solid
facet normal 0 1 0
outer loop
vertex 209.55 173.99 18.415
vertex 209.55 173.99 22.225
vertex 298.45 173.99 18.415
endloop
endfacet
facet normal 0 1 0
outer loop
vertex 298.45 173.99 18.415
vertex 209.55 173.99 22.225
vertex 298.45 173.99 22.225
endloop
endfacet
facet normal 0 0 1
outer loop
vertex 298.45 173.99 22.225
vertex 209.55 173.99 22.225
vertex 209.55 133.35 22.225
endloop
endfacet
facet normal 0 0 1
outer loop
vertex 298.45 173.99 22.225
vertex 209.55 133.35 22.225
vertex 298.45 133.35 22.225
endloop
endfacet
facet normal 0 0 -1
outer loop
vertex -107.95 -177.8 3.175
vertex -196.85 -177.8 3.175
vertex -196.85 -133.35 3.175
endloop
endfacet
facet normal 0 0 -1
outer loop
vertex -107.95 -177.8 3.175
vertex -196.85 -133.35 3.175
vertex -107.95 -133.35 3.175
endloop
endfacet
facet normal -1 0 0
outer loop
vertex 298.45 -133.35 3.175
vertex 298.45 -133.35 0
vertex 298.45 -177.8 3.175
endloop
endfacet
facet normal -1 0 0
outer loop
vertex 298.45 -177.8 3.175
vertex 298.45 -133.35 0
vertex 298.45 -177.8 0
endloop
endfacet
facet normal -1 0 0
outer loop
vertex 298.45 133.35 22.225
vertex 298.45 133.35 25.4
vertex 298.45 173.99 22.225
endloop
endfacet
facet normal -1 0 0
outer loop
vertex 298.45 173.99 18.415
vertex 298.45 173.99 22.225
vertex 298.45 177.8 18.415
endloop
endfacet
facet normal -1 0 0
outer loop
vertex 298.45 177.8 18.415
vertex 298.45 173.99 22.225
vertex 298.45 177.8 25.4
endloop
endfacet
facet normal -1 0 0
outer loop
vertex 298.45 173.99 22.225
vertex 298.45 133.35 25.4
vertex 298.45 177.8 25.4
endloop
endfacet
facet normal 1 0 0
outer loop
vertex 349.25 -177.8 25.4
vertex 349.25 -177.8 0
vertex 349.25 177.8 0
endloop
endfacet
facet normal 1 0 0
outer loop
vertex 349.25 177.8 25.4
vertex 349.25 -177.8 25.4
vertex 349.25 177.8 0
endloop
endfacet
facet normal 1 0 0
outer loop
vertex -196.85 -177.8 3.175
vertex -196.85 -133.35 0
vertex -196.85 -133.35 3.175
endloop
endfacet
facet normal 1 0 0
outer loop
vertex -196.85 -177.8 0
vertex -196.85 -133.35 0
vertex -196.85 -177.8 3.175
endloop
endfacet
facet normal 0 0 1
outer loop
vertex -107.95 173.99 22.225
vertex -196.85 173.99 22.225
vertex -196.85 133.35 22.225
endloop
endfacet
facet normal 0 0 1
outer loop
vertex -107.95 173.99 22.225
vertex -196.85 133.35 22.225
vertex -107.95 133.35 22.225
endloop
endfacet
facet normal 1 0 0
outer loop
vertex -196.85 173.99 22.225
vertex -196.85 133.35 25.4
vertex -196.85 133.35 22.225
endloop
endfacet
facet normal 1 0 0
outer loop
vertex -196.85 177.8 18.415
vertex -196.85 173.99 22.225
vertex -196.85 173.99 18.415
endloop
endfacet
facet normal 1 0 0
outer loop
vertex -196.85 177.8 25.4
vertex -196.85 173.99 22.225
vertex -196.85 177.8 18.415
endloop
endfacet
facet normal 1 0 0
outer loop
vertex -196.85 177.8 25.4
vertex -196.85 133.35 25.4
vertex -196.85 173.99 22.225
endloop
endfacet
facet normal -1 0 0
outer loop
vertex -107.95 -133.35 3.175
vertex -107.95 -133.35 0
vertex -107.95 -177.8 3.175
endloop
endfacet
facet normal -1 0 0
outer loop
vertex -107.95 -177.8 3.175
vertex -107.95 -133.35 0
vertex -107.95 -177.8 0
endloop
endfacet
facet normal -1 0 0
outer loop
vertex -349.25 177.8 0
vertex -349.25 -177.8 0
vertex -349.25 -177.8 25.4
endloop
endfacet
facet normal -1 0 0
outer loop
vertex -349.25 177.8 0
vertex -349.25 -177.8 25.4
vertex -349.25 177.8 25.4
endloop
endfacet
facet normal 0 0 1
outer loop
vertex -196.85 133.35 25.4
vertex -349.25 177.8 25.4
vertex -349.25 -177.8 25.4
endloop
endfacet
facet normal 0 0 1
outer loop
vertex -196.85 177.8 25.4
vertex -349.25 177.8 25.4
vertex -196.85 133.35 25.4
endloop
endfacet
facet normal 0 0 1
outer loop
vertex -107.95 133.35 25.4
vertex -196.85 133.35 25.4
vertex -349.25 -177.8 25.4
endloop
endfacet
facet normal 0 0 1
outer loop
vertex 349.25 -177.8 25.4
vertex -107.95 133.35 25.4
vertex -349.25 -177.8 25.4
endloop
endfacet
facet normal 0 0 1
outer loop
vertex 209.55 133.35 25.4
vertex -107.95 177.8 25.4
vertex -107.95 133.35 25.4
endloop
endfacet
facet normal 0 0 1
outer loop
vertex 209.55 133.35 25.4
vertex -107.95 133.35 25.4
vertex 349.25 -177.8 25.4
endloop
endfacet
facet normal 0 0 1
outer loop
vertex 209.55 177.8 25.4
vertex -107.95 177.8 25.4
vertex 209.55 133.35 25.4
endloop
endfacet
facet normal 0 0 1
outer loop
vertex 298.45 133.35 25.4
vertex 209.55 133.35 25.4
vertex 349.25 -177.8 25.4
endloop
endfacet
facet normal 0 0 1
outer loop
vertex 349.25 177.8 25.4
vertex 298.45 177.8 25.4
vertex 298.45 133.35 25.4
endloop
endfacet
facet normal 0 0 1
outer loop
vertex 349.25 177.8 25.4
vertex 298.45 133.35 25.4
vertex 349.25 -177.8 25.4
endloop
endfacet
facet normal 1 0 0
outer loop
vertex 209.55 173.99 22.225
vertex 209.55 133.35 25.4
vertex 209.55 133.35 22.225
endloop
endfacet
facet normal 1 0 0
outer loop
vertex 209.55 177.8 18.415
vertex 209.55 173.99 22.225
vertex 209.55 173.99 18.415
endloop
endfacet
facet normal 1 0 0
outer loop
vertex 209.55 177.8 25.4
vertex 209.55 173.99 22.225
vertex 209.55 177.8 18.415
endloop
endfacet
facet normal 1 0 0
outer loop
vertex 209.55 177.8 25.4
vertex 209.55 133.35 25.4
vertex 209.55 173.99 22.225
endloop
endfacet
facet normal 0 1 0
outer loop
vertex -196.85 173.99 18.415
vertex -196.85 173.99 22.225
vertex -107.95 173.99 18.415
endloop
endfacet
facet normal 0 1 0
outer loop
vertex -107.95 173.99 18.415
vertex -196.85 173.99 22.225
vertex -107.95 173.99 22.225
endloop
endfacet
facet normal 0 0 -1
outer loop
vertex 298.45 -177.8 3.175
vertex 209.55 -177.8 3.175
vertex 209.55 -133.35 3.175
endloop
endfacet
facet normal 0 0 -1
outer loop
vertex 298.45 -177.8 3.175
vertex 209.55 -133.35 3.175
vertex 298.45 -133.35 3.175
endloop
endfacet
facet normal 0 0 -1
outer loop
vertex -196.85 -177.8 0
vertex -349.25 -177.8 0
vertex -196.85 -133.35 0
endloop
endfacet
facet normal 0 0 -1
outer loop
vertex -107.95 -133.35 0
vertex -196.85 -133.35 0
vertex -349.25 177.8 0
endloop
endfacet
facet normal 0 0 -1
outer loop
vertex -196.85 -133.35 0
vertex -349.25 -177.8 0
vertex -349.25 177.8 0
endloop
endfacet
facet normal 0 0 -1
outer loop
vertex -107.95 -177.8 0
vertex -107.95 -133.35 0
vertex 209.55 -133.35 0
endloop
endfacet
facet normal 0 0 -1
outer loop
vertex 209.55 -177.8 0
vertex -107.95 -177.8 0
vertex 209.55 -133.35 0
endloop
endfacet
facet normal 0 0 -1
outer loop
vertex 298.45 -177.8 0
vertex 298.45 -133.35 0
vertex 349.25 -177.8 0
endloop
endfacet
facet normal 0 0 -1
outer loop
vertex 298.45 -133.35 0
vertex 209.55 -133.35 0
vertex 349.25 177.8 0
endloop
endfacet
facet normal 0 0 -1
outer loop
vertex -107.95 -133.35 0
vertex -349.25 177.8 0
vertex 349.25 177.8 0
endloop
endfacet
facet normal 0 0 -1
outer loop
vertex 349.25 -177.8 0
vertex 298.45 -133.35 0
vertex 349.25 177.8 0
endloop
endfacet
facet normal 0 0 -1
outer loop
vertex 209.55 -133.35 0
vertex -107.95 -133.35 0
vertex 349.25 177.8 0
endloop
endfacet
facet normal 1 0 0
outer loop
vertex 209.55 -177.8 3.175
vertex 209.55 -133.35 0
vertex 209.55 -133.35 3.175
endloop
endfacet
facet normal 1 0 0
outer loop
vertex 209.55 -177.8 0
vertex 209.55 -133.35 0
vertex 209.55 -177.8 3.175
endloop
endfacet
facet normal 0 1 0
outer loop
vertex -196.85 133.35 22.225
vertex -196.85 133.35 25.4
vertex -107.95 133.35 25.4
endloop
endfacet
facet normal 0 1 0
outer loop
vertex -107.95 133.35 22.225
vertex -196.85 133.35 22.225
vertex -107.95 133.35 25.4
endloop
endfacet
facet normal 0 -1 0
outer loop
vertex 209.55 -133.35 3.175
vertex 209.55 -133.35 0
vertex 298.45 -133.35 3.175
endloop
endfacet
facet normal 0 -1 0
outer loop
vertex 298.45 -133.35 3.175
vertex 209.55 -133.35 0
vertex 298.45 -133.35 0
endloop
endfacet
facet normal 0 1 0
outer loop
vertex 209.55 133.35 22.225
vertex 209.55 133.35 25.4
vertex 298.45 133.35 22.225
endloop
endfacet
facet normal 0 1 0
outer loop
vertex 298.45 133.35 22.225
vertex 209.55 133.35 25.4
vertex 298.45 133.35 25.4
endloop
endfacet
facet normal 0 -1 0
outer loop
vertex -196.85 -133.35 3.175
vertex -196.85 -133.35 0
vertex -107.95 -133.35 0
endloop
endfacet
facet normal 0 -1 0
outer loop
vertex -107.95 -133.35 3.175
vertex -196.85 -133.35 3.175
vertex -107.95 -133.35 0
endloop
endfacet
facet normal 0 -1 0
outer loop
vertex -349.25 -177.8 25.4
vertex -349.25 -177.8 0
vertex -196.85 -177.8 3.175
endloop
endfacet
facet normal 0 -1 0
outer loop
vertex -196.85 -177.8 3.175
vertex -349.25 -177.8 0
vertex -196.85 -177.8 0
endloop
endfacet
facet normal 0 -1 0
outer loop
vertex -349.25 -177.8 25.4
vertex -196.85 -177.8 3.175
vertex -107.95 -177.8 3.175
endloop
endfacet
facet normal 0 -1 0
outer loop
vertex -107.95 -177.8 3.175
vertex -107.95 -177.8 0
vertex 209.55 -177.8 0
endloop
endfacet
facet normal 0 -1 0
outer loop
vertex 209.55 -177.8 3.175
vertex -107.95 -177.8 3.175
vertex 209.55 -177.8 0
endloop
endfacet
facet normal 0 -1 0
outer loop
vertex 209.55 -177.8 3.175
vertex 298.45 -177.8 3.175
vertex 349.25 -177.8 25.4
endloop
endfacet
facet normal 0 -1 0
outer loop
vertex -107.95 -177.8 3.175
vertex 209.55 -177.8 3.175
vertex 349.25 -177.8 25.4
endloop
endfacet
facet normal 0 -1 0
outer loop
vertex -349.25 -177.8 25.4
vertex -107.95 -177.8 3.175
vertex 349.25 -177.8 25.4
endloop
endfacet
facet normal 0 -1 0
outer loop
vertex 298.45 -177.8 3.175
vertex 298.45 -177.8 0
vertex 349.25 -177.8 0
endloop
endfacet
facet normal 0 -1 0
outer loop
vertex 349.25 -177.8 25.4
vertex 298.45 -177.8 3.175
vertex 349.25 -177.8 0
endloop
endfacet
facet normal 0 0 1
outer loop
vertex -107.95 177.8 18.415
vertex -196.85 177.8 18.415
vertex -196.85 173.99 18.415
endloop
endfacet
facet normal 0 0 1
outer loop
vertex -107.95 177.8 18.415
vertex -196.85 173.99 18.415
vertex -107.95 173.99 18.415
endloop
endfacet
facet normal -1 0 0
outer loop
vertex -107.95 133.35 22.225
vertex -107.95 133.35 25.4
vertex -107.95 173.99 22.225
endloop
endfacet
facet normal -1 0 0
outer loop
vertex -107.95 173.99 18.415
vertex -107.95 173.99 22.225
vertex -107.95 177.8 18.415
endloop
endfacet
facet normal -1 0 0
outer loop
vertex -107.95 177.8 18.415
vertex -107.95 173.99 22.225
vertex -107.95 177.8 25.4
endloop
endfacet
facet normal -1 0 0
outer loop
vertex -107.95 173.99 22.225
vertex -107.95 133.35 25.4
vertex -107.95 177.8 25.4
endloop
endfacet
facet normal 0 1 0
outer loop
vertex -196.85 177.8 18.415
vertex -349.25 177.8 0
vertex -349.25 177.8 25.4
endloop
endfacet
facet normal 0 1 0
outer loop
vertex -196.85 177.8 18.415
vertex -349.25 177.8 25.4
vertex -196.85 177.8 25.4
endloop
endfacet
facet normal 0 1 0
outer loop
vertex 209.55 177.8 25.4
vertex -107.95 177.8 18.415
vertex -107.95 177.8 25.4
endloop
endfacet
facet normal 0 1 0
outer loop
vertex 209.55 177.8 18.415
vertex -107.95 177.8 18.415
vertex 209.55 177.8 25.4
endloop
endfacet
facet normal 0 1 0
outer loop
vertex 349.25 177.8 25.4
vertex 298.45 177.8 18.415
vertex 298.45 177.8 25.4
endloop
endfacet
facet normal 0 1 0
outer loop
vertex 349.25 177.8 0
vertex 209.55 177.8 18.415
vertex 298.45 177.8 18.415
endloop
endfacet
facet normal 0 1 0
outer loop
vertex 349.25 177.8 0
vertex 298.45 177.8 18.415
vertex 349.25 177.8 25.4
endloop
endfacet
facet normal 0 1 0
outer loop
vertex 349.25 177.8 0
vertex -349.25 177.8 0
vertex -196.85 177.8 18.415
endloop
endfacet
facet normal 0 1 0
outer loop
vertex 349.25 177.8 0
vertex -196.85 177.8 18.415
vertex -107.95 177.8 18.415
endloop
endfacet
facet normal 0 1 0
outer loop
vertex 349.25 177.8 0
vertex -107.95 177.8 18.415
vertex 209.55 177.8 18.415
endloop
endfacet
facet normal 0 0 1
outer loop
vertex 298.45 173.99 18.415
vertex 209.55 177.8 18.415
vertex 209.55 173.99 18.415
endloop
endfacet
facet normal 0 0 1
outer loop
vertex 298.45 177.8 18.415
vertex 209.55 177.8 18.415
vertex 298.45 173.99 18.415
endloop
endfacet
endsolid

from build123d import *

# Parameters (mm, degrees)
F0_W     = 698.5
F0_H     = 355.6
F1_DEPTH = 25.4
F2_W     = 88.9
F2_H     = 44.45
F3_DEPTH = 3.175
F4_W     = 88.9
F4_H     = 44.45
F5_DEPTH = 3.175
F6_W     = 88.9
F6_H     = 3.81
F7_DEPTH = 3.81
F8_W     = 88.9
F8_H     = 3.81
F9_DEPTH = 3.81


with BuildPart() as f1:
    # F0 (on Top) → F1 (new body)
    with BuildSketch(Plane.XY):
        Rectangle(F0_W, F0_H)
    extrude(amount=F1_DEPTH)

    # F2 (on face) → F3 (cut)
    with BuildSketch(Plane.XY.offset(25.4)):
        with Locations((-152.4, 155.575)):
            Rectangle(F2_W, F2_H)
        with Locations((254, 155.575)):
            Rectangle(F2_W, F2_H)
    extrude(amount=-F3_DEPTH, mode=Mode.SUBTRACT)

    # F4 (on face) → F5 (cut)
    with BuildSketch(Plane(origin=(0, 0, 0), x_dir=(1, 0, 0), z_dir=(0, 0, -1))):
        with Locations((254, 155.575)):
            Rectangle(F4_W, F4_H)
        with Locations((-152.4, 155.575)):
            Rectangle(F4_W, F4_H)
    extrude(amount=-F5_DEPTH, mode=Mode.SUBTRACT)

    # F6 (on face) → F7 (cut)
    with BuildSketch(Plane.XY.offset(22.225)):
        with Locations((-152.4, 175.895)):
            Rectangle(F6_W, F6_H)
    extrude(amount=-F7_DEPTH, mode=Mode.SUBTRACT)

    # F8 (on face) → F9 (cut)
    with BuildSketch(Plane.XY.offset(22.225)):
        with Locations((254, 175.895)):
            Rectangle(F8_W, F8_H)
    extrude(amount=-F9_DEPTH, mode=Mode.SUBTRACT)


solid = f1.part
